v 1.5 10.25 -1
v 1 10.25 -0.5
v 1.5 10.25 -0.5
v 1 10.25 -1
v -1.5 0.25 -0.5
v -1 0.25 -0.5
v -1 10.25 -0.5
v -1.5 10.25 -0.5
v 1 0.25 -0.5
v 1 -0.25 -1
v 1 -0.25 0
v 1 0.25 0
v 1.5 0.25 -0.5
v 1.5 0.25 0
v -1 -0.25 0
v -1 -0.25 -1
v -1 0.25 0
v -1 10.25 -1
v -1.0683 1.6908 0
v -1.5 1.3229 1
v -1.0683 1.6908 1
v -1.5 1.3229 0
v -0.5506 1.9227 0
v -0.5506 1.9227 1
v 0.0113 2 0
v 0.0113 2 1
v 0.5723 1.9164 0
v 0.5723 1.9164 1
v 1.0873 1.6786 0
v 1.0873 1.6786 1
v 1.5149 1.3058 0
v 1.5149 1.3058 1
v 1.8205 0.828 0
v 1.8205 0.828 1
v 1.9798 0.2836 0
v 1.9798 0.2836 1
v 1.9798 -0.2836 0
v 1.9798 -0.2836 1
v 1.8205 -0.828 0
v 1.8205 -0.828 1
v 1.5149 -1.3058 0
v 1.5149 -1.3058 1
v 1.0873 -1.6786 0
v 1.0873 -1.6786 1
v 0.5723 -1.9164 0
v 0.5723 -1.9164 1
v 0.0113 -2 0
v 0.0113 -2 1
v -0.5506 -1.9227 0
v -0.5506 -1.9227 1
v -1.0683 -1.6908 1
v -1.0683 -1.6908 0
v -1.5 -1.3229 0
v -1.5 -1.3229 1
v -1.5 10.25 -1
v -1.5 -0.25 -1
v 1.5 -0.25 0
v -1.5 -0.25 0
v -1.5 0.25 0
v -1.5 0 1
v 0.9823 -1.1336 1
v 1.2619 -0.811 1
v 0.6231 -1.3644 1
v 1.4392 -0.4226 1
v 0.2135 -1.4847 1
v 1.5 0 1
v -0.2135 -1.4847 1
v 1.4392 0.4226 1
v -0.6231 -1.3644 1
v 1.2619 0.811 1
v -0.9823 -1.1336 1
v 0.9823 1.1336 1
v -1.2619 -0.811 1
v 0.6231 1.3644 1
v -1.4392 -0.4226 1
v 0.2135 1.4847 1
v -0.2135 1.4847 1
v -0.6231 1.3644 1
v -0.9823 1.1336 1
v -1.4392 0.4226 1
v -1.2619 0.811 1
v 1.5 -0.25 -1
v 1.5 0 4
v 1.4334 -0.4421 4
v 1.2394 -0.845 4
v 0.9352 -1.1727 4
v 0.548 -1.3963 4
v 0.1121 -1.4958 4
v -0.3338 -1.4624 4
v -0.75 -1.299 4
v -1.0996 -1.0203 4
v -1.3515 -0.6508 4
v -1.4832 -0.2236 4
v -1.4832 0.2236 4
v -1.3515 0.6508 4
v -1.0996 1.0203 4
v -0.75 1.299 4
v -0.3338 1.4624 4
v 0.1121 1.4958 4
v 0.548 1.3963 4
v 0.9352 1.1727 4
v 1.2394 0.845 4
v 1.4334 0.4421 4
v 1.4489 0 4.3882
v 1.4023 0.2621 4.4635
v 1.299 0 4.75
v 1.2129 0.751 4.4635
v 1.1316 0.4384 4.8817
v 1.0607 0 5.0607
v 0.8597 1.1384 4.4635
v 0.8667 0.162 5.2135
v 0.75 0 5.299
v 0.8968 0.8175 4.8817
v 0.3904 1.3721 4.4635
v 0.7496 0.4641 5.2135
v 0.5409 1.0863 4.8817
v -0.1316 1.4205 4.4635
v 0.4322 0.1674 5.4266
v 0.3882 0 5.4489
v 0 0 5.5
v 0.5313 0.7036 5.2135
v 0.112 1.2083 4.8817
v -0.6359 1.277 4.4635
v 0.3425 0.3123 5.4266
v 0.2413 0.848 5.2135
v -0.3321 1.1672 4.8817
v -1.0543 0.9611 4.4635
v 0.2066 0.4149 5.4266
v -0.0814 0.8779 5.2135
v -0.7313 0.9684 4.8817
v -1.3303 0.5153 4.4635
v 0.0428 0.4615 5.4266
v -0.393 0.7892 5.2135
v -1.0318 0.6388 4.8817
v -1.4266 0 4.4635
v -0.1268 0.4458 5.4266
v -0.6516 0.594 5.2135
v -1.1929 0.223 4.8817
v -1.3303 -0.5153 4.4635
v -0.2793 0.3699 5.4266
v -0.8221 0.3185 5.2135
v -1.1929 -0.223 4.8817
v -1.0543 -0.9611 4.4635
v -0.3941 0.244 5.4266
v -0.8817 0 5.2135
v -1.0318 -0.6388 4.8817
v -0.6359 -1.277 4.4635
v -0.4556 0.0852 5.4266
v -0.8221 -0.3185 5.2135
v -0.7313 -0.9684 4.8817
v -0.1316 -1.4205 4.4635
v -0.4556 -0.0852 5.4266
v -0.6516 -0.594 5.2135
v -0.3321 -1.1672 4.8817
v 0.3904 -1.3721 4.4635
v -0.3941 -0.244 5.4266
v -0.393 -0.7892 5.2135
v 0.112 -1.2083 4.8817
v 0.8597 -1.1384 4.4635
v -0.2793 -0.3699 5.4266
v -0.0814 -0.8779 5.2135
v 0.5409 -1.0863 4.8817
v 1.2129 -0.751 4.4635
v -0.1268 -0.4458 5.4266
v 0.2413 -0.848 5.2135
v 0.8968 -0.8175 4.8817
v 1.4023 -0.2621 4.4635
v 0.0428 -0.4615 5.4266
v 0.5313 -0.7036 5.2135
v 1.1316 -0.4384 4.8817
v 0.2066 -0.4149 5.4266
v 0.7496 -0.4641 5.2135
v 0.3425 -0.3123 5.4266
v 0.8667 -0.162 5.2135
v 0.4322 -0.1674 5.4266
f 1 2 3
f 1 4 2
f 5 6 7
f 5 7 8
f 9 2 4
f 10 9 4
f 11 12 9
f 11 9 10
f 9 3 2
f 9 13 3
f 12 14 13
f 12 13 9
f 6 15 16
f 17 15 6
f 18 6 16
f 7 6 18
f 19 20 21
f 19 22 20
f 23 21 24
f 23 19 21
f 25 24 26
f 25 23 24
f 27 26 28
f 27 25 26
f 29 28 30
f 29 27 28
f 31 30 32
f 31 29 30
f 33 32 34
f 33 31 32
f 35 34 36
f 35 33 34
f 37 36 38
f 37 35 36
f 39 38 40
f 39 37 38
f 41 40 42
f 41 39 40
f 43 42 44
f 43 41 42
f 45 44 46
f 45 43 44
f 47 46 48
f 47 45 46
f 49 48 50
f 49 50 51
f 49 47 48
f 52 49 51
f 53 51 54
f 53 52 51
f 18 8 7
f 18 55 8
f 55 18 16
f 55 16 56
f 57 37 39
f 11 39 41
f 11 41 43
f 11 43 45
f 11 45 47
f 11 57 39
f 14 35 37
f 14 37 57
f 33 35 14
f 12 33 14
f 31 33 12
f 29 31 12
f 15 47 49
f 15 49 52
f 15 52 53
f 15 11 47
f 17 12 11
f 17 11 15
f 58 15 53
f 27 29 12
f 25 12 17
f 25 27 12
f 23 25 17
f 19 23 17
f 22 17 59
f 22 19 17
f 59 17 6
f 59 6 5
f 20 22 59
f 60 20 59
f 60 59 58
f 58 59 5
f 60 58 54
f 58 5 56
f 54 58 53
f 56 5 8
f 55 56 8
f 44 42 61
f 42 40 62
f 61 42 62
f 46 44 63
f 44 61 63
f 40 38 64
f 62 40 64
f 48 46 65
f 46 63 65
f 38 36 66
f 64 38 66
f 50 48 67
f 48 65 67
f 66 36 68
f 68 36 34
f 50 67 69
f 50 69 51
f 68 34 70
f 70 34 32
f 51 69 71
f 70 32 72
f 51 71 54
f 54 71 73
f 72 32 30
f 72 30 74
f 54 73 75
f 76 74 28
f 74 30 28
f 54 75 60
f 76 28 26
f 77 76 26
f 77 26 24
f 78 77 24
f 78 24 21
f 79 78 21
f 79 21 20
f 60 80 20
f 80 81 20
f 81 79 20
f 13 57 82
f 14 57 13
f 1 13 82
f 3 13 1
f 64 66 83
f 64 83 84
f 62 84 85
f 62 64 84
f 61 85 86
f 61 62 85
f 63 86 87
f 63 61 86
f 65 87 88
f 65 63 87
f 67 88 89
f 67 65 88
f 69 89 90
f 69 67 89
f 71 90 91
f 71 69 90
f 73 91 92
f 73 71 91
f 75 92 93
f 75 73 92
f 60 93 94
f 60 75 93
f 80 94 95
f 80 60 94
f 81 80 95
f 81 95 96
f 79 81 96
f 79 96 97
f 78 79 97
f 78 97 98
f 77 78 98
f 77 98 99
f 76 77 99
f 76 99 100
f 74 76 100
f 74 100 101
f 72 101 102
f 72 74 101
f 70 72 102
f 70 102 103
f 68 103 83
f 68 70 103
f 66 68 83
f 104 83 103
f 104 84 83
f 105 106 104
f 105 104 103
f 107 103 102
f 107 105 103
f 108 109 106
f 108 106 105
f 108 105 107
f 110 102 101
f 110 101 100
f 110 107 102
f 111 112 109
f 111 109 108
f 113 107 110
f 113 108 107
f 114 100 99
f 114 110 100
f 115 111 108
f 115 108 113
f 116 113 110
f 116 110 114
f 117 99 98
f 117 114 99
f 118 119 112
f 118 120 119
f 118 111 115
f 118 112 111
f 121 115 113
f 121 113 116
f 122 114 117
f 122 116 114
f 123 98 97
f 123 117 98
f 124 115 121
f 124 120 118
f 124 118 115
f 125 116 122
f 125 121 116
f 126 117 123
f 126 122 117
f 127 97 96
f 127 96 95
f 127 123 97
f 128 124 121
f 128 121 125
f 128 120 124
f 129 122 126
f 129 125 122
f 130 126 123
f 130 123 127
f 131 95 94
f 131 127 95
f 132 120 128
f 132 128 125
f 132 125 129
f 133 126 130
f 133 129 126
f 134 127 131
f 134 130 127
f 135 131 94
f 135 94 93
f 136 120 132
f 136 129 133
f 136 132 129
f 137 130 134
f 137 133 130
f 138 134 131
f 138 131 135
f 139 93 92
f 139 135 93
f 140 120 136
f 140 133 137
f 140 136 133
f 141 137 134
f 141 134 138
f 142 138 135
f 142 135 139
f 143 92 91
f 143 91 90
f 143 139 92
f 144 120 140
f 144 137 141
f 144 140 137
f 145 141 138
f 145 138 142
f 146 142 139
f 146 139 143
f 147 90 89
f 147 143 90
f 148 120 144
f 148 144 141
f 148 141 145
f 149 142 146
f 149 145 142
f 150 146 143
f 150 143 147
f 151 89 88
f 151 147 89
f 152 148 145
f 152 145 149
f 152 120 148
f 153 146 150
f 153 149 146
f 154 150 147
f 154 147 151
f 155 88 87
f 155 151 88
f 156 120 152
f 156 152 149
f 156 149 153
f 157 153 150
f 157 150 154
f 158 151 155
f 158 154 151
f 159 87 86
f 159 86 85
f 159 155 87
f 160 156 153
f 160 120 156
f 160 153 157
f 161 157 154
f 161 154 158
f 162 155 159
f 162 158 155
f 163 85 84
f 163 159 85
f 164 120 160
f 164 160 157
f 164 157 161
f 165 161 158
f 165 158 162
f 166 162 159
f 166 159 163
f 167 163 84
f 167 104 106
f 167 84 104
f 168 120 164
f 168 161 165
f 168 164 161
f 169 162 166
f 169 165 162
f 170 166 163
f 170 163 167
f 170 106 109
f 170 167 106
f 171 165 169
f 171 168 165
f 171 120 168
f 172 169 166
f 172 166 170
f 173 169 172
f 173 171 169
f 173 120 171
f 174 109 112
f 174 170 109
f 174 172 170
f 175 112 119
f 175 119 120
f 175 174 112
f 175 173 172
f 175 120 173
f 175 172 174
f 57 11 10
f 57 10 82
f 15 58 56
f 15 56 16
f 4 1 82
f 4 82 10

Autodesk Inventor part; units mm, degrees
ref_plane "YZ Plane" through (0, 0, 0) normal (1, 0, 0) x (0, 1, 0)
ref_plane "XZ Plane" through (0, 0, 0) normal (0, 1, 0) x (-1, 0, 0)
ref_plane "XY Plane" through (0, 0, 0) normal (0, 0, 1) x (1, 0, 0)
sketch "Skizze1" plane through (0, 0, 0) normal (0, 0, 1) x (1, 0, 0)
  circle A0 centre (0, 0) radius 1.5
  dimension "d0" = 3
extrude "Extrusion1" add sketch "Skizze1" along normal blind 5.5
fillet "Rundung1" radius 1.5 1 edges at (-1.5, 0, 5.5)
sketch "Skizze2" plane through (0, 0, 0) normal (0, 0, -1) x (-1, 0, 0)
  circle A0 centre (0, 0) radius 2
  line L0 (1.5, 1.3229) -> (1.5, -1.3229)
  circle A1 centre (0, 0) radius 1.5 projected
  point P0 (1.5, 0)
  dimension "d4" = 4
extrude "Extrusion2" add sketch "Skizze2" against normal blind 1 contours L0 A0 picked at (-1.7994, 0.2793)
sketch "Skizze3" plane through (0, 0, 0) normal (0, 0, -1) x (-1, 0, 0)
  line L0 (1.5, -0.25) -> (1, -0.25)
  line L1 (1, -0.25) -> (1, 0.25)
  line L2 (1, 0.25) -> (1.5, 0.25)
  line L3 (1.5, 0.25) -> (1.5, -0.25)
  line L4 (-1, -0.25) -> (-1.5, -0.25)
  line L5 (-1.5, -0.25) -> (-1.5, 0.25)
  line L6 (-1.5, 0.25) -> (-1, 0.25)
  line L7 (-1, 0.25) -> (-1, -0.25)
  line L8 (1, 0) -> (-1, 0) construction
  point P0 (0, 0)
  point P1 (0, 0)
  point P2 (1.25, -0.25)
  point P3 (-1.25, -0.25)
  dimension "d7" = 0.5
  dimension "d9" = 2.5
extrude "Extrusion3" add sketch "Skizze3" along normal blind 1
sketch "Skizze4" plane through (-1.5, 0.25, 0) normal (0, 1, 0) x (1, 0, 0)
  line L0 (0, 0) -> (0, 1) projected
  line L1 (0.5, 0) -> (0.5, 1) projected
  line L2 (0, 1) -> (0.5, 1)
  line L3 (0.5, 1) -> (0.5, 0.5)
  line L4 (0.5, 0.5) -> (0, 0.5)
  line L5 (0, 0.5) -> (0, 1)
  line L6 (2.5, 0) -> (2.5, 1) projected
  line L7 (3, 0) -> (3, 1) projected
  line L8 (2.5, 1) -> (3, 1)
  line L9 (3, 1) -> (3, 0.5)
  line L10 (3, 0.5) -> (2.5, 0.5)
  line L11 (2.5, 0.5) -> (2.5, 1)
  point P0 (1.5, 0)
extrude "Extrusion4" add sketch "Skizze4" along normal blind 10
properties part number "LED 3mm" material "Silber"
